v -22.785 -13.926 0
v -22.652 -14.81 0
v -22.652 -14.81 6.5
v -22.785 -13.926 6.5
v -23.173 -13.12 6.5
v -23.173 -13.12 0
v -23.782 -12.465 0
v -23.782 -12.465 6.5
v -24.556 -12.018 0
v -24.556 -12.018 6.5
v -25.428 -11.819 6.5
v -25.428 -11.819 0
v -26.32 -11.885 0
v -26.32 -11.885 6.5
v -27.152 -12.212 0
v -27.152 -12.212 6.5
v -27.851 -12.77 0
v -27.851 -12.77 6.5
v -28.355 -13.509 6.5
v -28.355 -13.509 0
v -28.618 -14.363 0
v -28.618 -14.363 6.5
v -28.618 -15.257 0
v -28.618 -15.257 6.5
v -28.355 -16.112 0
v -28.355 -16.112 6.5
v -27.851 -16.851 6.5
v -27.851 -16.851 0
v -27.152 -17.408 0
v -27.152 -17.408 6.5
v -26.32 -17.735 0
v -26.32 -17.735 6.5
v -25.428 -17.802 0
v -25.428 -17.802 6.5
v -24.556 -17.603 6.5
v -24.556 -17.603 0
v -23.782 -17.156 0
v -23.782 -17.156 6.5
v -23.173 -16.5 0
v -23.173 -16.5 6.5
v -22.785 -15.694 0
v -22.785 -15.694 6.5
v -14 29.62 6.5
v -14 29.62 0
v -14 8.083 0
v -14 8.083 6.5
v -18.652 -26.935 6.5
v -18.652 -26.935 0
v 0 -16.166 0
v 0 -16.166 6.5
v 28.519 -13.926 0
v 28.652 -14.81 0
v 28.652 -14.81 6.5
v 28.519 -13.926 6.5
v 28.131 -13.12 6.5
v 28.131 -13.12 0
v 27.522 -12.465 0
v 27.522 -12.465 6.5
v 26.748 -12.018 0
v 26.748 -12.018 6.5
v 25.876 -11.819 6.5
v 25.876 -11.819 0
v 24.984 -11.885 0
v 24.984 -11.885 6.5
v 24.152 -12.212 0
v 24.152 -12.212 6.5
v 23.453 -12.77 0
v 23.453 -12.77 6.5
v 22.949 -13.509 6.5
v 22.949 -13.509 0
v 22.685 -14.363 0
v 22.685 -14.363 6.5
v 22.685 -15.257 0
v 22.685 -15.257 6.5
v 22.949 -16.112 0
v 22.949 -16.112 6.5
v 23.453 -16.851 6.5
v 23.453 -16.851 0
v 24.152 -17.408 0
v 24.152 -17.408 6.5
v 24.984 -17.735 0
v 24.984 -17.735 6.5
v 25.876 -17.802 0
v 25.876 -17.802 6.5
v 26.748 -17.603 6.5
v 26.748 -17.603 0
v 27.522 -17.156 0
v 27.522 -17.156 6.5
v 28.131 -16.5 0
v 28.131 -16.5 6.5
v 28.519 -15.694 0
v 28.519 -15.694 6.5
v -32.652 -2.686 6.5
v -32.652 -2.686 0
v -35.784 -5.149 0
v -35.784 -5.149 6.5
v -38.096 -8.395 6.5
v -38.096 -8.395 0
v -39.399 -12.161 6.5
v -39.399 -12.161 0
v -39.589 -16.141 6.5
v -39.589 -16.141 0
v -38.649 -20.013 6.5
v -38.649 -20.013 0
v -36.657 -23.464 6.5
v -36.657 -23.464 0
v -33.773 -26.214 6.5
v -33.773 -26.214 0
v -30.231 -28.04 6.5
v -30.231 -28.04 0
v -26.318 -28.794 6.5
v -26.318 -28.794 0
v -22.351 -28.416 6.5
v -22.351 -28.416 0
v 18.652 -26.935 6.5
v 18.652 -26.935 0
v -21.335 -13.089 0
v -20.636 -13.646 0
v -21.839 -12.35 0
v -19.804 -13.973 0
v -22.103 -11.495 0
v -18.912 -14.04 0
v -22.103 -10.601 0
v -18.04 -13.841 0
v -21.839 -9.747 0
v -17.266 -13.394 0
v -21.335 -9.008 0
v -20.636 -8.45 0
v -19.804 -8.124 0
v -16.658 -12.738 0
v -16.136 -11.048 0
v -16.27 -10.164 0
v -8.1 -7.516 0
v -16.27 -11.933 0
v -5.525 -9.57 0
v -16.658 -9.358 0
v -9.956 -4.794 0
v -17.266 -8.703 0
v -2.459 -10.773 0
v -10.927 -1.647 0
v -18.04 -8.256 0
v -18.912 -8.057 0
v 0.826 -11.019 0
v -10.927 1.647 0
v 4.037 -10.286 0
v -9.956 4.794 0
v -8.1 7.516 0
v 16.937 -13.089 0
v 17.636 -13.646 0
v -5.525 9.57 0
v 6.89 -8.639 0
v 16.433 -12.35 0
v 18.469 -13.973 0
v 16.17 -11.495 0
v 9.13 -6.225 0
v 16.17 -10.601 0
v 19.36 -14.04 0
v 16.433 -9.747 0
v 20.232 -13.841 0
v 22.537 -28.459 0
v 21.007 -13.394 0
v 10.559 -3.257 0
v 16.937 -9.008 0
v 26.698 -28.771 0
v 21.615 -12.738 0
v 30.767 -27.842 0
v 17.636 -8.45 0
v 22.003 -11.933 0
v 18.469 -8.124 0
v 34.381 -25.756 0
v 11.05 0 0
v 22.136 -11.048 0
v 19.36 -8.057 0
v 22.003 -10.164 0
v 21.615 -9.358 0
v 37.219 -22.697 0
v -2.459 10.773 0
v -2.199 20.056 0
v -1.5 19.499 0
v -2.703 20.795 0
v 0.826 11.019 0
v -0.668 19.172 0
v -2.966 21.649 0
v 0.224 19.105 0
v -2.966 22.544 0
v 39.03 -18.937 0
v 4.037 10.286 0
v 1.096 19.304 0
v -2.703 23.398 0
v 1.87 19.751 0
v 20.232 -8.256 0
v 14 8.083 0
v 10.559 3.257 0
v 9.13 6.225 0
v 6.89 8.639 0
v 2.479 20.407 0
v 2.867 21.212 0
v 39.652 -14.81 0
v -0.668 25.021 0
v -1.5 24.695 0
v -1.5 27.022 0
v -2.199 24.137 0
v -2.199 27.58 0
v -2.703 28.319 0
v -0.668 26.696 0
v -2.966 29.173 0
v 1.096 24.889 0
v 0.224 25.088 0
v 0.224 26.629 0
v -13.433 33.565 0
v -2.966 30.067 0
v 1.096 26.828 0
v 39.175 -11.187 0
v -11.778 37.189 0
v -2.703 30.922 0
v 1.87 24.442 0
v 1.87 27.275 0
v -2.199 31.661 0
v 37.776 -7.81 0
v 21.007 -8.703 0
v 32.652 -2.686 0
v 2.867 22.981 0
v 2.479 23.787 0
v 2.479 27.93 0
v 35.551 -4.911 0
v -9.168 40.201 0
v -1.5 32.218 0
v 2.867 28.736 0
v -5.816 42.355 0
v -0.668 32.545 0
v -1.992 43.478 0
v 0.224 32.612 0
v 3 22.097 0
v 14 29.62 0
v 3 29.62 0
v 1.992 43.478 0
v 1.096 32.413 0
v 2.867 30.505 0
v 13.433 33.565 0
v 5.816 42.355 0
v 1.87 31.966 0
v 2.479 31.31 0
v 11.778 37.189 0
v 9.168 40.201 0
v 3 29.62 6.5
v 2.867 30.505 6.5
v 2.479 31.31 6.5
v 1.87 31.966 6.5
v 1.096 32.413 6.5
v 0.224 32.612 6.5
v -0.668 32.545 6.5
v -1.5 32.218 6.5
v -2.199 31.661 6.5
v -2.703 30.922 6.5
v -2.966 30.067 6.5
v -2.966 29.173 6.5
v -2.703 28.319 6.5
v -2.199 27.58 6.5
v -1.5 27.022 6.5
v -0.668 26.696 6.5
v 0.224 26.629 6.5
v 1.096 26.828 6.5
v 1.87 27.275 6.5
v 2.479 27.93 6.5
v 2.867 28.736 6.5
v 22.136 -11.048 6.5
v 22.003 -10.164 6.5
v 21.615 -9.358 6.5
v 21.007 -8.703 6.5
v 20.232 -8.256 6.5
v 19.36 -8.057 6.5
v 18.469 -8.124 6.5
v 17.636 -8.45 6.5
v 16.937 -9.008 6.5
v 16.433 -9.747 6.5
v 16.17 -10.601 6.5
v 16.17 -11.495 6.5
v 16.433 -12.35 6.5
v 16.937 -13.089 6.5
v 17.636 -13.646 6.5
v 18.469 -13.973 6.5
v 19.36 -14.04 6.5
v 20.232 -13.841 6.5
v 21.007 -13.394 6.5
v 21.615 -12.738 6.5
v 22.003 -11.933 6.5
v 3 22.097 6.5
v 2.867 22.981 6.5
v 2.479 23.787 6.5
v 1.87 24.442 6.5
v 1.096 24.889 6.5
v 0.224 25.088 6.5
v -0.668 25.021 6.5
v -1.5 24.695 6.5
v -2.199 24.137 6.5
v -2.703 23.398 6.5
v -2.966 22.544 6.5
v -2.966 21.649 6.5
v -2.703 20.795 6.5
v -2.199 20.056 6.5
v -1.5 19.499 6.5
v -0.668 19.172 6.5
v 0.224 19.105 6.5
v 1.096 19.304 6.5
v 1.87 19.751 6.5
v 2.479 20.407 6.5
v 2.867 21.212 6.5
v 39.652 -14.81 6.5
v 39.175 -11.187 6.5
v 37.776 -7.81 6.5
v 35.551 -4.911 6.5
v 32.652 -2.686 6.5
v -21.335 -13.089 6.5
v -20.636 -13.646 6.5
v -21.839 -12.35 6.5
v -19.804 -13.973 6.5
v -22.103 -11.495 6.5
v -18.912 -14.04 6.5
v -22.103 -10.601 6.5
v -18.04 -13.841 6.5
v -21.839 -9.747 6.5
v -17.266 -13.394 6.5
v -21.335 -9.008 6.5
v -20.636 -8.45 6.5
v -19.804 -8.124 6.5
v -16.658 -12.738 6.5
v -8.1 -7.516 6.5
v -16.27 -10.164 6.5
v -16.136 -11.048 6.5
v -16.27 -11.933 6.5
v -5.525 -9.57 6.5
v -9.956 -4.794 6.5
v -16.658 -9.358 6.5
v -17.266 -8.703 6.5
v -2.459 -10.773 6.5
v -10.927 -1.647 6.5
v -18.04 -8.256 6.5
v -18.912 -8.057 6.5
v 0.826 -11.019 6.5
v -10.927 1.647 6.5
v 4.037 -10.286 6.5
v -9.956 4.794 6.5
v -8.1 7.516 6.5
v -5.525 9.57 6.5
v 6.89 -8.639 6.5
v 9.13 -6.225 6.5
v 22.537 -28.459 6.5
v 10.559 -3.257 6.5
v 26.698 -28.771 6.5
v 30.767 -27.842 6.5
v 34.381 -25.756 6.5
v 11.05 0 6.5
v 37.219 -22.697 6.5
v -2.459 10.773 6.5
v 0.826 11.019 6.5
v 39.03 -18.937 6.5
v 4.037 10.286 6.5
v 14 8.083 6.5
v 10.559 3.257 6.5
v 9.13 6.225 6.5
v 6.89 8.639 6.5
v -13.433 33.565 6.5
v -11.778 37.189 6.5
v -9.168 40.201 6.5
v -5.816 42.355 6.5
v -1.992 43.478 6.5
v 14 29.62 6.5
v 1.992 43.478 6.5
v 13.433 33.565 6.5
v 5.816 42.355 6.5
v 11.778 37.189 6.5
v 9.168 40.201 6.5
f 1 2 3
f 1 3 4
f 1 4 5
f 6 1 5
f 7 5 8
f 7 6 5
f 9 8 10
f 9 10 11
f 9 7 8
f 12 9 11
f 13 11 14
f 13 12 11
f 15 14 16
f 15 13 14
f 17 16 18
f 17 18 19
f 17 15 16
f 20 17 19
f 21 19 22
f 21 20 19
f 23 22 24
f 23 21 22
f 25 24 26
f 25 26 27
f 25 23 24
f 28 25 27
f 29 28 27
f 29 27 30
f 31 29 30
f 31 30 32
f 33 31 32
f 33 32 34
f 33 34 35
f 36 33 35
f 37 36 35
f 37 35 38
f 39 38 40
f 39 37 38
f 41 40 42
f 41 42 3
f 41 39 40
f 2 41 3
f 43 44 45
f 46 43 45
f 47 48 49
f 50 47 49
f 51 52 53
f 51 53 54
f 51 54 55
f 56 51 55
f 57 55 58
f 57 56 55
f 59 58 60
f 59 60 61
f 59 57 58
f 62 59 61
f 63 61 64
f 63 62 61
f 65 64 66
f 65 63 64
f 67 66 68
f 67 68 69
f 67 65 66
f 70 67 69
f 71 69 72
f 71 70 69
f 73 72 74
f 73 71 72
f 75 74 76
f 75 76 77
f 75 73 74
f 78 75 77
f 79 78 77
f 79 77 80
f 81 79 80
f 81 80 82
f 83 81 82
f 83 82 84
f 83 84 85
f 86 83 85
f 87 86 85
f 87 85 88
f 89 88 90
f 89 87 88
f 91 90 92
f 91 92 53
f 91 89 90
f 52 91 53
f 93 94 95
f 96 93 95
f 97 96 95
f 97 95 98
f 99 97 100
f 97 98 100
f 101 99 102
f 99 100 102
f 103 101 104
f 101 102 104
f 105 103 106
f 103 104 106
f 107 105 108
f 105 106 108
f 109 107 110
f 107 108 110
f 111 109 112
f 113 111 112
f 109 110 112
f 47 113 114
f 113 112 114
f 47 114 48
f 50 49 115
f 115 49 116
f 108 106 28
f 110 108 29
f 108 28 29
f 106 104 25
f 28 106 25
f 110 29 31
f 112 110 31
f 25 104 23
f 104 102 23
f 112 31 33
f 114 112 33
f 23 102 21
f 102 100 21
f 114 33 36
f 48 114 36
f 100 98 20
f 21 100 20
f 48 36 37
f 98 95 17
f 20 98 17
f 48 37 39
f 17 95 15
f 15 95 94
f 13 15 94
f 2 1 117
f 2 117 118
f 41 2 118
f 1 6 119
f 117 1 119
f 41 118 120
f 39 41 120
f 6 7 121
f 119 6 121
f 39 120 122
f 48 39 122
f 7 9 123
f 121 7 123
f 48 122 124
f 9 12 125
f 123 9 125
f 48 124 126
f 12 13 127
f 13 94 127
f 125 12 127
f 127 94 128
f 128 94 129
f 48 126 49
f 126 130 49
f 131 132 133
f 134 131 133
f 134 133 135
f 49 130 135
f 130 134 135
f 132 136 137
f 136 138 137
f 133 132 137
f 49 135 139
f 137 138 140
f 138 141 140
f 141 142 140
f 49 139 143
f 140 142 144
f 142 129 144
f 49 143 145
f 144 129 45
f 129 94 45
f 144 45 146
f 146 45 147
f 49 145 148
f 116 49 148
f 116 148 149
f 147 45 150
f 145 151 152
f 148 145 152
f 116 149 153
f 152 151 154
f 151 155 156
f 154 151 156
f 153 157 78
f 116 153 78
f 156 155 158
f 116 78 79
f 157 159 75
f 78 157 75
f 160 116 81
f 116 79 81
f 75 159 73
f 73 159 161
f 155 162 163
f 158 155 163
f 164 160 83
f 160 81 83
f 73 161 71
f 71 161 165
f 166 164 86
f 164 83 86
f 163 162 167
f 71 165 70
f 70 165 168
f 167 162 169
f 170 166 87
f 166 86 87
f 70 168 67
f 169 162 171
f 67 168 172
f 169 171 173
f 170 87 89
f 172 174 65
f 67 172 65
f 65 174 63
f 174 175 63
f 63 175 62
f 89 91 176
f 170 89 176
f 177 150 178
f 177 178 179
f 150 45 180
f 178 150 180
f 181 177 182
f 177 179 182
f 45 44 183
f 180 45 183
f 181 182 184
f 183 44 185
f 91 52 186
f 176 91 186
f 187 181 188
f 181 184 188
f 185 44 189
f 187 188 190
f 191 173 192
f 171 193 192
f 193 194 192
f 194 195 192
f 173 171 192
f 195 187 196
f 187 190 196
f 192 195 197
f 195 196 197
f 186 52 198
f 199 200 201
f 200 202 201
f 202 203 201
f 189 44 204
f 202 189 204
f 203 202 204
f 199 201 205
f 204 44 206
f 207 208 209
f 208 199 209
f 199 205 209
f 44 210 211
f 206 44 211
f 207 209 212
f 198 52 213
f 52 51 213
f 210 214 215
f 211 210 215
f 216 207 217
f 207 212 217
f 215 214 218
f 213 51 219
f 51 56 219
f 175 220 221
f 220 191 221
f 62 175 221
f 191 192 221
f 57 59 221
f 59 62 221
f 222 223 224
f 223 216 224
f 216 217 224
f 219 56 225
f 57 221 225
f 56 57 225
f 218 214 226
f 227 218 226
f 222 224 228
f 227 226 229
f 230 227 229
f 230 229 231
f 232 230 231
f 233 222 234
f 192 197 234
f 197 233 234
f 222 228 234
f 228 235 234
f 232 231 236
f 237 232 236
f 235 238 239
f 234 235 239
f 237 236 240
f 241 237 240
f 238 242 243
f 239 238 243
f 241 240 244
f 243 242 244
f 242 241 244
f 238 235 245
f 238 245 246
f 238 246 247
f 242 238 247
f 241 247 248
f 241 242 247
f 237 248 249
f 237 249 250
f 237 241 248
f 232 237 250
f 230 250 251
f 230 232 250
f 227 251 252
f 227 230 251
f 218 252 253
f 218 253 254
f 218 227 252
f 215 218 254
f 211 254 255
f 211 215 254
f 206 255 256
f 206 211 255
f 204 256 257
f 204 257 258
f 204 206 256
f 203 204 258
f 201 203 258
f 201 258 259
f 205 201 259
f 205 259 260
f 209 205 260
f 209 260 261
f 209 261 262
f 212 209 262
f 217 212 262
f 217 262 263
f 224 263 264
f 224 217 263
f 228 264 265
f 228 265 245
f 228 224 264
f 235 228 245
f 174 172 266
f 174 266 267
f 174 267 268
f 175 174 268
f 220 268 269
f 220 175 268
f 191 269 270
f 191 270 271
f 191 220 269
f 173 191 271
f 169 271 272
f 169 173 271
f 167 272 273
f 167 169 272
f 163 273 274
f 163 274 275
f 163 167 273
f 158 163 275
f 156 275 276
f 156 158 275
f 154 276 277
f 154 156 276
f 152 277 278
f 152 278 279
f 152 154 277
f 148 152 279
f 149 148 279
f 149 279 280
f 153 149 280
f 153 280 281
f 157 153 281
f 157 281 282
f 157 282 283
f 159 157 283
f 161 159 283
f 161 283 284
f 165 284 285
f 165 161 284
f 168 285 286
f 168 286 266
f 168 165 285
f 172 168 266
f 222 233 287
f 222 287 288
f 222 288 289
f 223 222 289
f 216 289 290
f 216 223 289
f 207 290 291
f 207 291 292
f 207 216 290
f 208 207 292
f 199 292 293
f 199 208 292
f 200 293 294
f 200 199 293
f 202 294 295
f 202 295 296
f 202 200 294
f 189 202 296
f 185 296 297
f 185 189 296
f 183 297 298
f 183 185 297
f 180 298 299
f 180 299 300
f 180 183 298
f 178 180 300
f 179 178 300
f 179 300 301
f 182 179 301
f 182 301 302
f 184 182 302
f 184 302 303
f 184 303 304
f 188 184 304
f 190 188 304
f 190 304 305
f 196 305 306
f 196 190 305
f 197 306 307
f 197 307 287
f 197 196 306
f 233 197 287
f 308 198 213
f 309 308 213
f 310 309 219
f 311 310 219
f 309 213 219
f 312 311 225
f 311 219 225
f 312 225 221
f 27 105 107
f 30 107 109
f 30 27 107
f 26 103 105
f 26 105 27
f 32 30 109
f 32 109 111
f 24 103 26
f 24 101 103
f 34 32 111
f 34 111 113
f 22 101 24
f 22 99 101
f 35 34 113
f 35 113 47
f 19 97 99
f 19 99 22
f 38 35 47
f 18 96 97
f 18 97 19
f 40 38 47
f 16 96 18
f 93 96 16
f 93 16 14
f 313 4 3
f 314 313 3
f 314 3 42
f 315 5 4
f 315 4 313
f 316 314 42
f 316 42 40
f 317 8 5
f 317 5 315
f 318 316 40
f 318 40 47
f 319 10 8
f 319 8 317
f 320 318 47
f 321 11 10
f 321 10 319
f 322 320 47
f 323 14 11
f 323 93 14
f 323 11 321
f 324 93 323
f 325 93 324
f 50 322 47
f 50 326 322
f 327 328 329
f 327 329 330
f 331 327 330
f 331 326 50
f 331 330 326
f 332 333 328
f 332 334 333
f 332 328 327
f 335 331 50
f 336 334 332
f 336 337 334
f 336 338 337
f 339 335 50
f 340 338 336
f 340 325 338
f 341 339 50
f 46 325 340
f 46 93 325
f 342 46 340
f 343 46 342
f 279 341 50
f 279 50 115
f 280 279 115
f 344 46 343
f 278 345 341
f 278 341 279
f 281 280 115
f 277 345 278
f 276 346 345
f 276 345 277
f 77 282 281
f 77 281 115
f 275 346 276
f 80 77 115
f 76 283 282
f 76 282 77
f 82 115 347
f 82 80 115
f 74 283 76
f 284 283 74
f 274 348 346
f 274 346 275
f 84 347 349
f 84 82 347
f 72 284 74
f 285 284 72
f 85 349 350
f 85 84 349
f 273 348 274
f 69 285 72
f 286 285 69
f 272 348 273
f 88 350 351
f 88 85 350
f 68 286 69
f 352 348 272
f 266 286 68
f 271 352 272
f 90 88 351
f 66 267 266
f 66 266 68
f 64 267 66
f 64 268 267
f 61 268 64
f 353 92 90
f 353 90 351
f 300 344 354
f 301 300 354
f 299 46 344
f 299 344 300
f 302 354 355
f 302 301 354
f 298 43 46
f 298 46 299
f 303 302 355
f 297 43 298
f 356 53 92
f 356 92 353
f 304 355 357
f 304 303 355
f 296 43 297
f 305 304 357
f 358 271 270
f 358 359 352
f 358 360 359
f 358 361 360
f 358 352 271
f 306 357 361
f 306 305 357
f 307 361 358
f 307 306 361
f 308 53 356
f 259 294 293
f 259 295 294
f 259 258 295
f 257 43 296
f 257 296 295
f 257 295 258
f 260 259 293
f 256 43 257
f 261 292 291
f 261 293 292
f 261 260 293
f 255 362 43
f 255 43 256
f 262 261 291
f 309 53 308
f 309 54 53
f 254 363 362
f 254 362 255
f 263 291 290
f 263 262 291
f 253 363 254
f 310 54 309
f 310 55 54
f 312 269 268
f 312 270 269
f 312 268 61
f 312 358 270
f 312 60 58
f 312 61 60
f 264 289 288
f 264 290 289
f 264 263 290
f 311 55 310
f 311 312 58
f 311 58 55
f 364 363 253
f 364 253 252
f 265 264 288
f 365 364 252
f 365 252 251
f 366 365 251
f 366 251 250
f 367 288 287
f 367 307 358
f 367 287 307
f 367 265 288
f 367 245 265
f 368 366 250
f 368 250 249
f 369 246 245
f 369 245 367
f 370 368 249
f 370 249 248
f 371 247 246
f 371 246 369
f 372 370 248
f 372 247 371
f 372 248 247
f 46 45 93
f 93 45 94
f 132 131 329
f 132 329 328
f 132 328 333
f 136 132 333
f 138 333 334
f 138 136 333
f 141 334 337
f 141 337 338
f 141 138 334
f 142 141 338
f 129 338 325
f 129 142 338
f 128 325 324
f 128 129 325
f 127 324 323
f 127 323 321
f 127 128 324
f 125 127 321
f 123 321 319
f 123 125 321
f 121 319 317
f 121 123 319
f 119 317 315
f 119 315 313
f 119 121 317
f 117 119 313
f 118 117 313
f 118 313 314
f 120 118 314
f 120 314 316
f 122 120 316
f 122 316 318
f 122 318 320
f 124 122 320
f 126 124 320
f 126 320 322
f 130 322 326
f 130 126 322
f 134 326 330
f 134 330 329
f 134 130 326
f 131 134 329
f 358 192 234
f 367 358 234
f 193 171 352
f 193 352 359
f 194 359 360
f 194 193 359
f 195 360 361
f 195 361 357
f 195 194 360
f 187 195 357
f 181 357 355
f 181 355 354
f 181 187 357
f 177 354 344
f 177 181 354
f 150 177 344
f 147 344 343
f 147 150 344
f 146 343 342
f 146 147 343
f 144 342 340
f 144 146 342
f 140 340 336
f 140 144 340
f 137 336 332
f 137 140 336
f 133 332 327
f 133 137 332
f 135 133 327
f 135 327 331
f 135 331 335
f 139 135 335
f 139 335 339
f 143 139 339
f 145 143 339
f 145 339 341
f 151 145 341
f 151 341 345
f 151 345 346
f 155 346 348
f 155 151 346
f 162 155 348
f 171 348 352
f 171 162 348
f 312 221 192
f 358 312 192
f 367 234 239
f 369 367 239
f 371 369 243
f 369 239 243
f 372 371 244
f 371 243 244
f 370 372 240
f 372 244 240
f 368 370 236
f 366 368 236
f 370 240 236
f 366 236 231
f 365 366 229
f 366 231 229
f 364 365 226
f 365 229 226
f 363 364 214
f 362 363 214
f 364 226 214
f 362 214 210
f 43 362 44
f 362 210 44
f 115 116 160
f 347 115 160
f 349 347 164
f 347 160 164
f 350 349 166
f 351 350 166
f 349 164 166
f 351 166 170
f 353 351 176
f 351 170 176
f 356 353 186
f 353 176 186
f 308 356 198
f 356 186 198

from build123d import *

# Parameters (mm, degrees)
F0_R     = 3
F0_R_2   = 11.05
F1_DEPTH = 6.5


with BuildPart() as f1:
    # F0 (on Top) → F1 (new body)
    with BuildSketch(Plane.XY):
        with BuildLine():
            ThreePointArc((-32.6519768305, -2.6858200754), (-37.7763321694, -21.8101758986), (-18.6519763031, -26.9345310768))
            ThreePointArc((-18.6519763031, -26.9345310768), (-13.5276209102, -21.8101754521), (-11.6519766687, -14.8101756349))
            ThreePointArc((-11.6519766687, -14.8101756349), (-18.6519767496, -2.6858199352), (-32.6519768305, -2.6858200754))
        make_face()
        with Locations((-25.6519766687, -14.8101756349)):
            Circle(F0_R, mode=Mode.SUBTRACT)
        with Locations((-19.1362317873, -11.0483085737)):
            Circle(F0_R, mode=Mode.SUBTRACT)
        with BuildLine():
            Line((0, -16.1658075373), (-7, -12.124355653))
            ThreePointArc((-7, -12.124355653), (-12.124355653, -7), (-14, 0))
            Line((-14, 0), (-14, 8.0829037687))
            Line((-14, 8.0829037687), (-32.6519768305, -2.6858200754))
            ThreePointArc((-32.6519768305, -2.6858200754), (-18.6519767496, -2.6858199352), (-11.6519766687, -14.8101756349))
            ThreePointArc((-11.6519766687, -14.8101756349), (-13.5276209102, -21.8101754521), (-18.6519763031, -26.9345310768))
            Line((-18.6519763031, -26.9345310768), (0, -16.1658075373))
        make_face()
        with BuildLine():
            Line((0, -16.1658075373), (7, -12.124355653))
            ThreePointArc((7, -12.124355653), (0, -14), (-7, -12.124355653))
            Line((-7, -12.124355653), (0, -16.1658075373))
        make_face()
        with BuildLine():
            ThreePointArc((39.6519766687, -14.8101756349), (37.7763323684, -7.8101757158), (32.6519768305, -2.6858200754))
            ThreePointArc((32.6519768305, -2.6858200754), (13.5276209927, -7.8101756747), (18.6519769101, -26.9345314273))
            ThreePointArc((18.6519769101, -26.9345314273), (32.6519767894, -26.9345312182), (39.6519766687, -14.8101756349))
        make_face()
        with Locations((19.1362317873, -11.0483085737)):
            Circle(F0_R, mode=Mode.SUBTRACT)
        with Locations((25.6519766687, -14.8101756349)):
            Circle(F0_R, mode=Mode.SUBTRACT)
        with BuildLine():
            Line((14, 8.0829037687), (14, 0))
            ThreePointArc((14, 0), (12.124355653, -7), (7, -12.124355653))
            Line((7, -12.124355653), (0, -16.1658075373))
            Line((0, -16.1658075373), (18.6519769101, -26.9345314273))
            ThreePointArc((18.6519769101, -26.9345314273), (13.5276209927, -7.8101756747), (32.6519768305, -2.6858200754))
            Line((32.6519768305, -2.6858200754), (14, 8.0829037687))
        make_face()
        with BuildLine():
            ThreePointArc((-14, 29.6203512698), (0, 15.6203512698), (14, 29.6203512698))
            ThreePointArc((14, 29.6203512698), (0, 43.6203512698), (-14, 29.6203512698))
        make_face()
        with Locations((0, 22.0966171473)):
            Circle(F0_R, mode=Mode.SUBTRACT)
        with Locations((0, 29.6203512698)):
            Circle(F0_R, mode=Mode.SUBTRACT)
        with BuildLine():
            ThreePointArc((-7, 12.124355653), (0, 14), (7, 12.124355653))
            Line((7, 12.124355653), (14, 8.0829037687))
            Line((14, 8.0829037687), (14, 29.6203512698))
            ThreePointArc((14, 29.6203512698), (0, 15.6203512698), (-14, 29.6203512698))
            Line((-14, 29.6203512698), (-14, 8.0829037687))
            Line((-14, 8.0829037687), (-7, 12.124355653))
        make_face()
        with BuildLine():
            ThreePointArc((-14, 0), (-12.124355653, 7), (-7, 12.124355653))
            Line((-7, 12.124355653), (-14, 8.0829037687))
            Line((-14, 8.0829037687), (-14, 0))
        make_face()
        with BuildLine():
            ThreePointArc((7, -12.124355653), (12.124355653, -7), (14, 0))
            ThreePointArc((14, 0), (12.124355653, 7), (7, 12.124355653))
            ThreePointArc((7, 12.124355653), (0, 14), (-7, 12.124355653))
            ThreePointArc((-7, 12.124355653), (-12.124355653, 7), (-14, 0))
            ThreePointArc((-14, 0), (-12.124355653, -7), (-7, -12.124355653))
            ThreePointArc((-7, -12.124355653), (0, -14), (7, -12.124355653))
        make_face()
        Circle(F0_R_2, mode=Mode.SUBTRACT)
        with BuildLine():
            ThreePointArc((7, 12.124355653), (12.124355653, 7), (14, 0))
            Line((14, 0), (14, 8.0829037687))
            Line((14, 8.0829037687), (7, 12.124355653))
        make_face()
    extrude(amount=F1_DEPTH)


solid = f1.part
